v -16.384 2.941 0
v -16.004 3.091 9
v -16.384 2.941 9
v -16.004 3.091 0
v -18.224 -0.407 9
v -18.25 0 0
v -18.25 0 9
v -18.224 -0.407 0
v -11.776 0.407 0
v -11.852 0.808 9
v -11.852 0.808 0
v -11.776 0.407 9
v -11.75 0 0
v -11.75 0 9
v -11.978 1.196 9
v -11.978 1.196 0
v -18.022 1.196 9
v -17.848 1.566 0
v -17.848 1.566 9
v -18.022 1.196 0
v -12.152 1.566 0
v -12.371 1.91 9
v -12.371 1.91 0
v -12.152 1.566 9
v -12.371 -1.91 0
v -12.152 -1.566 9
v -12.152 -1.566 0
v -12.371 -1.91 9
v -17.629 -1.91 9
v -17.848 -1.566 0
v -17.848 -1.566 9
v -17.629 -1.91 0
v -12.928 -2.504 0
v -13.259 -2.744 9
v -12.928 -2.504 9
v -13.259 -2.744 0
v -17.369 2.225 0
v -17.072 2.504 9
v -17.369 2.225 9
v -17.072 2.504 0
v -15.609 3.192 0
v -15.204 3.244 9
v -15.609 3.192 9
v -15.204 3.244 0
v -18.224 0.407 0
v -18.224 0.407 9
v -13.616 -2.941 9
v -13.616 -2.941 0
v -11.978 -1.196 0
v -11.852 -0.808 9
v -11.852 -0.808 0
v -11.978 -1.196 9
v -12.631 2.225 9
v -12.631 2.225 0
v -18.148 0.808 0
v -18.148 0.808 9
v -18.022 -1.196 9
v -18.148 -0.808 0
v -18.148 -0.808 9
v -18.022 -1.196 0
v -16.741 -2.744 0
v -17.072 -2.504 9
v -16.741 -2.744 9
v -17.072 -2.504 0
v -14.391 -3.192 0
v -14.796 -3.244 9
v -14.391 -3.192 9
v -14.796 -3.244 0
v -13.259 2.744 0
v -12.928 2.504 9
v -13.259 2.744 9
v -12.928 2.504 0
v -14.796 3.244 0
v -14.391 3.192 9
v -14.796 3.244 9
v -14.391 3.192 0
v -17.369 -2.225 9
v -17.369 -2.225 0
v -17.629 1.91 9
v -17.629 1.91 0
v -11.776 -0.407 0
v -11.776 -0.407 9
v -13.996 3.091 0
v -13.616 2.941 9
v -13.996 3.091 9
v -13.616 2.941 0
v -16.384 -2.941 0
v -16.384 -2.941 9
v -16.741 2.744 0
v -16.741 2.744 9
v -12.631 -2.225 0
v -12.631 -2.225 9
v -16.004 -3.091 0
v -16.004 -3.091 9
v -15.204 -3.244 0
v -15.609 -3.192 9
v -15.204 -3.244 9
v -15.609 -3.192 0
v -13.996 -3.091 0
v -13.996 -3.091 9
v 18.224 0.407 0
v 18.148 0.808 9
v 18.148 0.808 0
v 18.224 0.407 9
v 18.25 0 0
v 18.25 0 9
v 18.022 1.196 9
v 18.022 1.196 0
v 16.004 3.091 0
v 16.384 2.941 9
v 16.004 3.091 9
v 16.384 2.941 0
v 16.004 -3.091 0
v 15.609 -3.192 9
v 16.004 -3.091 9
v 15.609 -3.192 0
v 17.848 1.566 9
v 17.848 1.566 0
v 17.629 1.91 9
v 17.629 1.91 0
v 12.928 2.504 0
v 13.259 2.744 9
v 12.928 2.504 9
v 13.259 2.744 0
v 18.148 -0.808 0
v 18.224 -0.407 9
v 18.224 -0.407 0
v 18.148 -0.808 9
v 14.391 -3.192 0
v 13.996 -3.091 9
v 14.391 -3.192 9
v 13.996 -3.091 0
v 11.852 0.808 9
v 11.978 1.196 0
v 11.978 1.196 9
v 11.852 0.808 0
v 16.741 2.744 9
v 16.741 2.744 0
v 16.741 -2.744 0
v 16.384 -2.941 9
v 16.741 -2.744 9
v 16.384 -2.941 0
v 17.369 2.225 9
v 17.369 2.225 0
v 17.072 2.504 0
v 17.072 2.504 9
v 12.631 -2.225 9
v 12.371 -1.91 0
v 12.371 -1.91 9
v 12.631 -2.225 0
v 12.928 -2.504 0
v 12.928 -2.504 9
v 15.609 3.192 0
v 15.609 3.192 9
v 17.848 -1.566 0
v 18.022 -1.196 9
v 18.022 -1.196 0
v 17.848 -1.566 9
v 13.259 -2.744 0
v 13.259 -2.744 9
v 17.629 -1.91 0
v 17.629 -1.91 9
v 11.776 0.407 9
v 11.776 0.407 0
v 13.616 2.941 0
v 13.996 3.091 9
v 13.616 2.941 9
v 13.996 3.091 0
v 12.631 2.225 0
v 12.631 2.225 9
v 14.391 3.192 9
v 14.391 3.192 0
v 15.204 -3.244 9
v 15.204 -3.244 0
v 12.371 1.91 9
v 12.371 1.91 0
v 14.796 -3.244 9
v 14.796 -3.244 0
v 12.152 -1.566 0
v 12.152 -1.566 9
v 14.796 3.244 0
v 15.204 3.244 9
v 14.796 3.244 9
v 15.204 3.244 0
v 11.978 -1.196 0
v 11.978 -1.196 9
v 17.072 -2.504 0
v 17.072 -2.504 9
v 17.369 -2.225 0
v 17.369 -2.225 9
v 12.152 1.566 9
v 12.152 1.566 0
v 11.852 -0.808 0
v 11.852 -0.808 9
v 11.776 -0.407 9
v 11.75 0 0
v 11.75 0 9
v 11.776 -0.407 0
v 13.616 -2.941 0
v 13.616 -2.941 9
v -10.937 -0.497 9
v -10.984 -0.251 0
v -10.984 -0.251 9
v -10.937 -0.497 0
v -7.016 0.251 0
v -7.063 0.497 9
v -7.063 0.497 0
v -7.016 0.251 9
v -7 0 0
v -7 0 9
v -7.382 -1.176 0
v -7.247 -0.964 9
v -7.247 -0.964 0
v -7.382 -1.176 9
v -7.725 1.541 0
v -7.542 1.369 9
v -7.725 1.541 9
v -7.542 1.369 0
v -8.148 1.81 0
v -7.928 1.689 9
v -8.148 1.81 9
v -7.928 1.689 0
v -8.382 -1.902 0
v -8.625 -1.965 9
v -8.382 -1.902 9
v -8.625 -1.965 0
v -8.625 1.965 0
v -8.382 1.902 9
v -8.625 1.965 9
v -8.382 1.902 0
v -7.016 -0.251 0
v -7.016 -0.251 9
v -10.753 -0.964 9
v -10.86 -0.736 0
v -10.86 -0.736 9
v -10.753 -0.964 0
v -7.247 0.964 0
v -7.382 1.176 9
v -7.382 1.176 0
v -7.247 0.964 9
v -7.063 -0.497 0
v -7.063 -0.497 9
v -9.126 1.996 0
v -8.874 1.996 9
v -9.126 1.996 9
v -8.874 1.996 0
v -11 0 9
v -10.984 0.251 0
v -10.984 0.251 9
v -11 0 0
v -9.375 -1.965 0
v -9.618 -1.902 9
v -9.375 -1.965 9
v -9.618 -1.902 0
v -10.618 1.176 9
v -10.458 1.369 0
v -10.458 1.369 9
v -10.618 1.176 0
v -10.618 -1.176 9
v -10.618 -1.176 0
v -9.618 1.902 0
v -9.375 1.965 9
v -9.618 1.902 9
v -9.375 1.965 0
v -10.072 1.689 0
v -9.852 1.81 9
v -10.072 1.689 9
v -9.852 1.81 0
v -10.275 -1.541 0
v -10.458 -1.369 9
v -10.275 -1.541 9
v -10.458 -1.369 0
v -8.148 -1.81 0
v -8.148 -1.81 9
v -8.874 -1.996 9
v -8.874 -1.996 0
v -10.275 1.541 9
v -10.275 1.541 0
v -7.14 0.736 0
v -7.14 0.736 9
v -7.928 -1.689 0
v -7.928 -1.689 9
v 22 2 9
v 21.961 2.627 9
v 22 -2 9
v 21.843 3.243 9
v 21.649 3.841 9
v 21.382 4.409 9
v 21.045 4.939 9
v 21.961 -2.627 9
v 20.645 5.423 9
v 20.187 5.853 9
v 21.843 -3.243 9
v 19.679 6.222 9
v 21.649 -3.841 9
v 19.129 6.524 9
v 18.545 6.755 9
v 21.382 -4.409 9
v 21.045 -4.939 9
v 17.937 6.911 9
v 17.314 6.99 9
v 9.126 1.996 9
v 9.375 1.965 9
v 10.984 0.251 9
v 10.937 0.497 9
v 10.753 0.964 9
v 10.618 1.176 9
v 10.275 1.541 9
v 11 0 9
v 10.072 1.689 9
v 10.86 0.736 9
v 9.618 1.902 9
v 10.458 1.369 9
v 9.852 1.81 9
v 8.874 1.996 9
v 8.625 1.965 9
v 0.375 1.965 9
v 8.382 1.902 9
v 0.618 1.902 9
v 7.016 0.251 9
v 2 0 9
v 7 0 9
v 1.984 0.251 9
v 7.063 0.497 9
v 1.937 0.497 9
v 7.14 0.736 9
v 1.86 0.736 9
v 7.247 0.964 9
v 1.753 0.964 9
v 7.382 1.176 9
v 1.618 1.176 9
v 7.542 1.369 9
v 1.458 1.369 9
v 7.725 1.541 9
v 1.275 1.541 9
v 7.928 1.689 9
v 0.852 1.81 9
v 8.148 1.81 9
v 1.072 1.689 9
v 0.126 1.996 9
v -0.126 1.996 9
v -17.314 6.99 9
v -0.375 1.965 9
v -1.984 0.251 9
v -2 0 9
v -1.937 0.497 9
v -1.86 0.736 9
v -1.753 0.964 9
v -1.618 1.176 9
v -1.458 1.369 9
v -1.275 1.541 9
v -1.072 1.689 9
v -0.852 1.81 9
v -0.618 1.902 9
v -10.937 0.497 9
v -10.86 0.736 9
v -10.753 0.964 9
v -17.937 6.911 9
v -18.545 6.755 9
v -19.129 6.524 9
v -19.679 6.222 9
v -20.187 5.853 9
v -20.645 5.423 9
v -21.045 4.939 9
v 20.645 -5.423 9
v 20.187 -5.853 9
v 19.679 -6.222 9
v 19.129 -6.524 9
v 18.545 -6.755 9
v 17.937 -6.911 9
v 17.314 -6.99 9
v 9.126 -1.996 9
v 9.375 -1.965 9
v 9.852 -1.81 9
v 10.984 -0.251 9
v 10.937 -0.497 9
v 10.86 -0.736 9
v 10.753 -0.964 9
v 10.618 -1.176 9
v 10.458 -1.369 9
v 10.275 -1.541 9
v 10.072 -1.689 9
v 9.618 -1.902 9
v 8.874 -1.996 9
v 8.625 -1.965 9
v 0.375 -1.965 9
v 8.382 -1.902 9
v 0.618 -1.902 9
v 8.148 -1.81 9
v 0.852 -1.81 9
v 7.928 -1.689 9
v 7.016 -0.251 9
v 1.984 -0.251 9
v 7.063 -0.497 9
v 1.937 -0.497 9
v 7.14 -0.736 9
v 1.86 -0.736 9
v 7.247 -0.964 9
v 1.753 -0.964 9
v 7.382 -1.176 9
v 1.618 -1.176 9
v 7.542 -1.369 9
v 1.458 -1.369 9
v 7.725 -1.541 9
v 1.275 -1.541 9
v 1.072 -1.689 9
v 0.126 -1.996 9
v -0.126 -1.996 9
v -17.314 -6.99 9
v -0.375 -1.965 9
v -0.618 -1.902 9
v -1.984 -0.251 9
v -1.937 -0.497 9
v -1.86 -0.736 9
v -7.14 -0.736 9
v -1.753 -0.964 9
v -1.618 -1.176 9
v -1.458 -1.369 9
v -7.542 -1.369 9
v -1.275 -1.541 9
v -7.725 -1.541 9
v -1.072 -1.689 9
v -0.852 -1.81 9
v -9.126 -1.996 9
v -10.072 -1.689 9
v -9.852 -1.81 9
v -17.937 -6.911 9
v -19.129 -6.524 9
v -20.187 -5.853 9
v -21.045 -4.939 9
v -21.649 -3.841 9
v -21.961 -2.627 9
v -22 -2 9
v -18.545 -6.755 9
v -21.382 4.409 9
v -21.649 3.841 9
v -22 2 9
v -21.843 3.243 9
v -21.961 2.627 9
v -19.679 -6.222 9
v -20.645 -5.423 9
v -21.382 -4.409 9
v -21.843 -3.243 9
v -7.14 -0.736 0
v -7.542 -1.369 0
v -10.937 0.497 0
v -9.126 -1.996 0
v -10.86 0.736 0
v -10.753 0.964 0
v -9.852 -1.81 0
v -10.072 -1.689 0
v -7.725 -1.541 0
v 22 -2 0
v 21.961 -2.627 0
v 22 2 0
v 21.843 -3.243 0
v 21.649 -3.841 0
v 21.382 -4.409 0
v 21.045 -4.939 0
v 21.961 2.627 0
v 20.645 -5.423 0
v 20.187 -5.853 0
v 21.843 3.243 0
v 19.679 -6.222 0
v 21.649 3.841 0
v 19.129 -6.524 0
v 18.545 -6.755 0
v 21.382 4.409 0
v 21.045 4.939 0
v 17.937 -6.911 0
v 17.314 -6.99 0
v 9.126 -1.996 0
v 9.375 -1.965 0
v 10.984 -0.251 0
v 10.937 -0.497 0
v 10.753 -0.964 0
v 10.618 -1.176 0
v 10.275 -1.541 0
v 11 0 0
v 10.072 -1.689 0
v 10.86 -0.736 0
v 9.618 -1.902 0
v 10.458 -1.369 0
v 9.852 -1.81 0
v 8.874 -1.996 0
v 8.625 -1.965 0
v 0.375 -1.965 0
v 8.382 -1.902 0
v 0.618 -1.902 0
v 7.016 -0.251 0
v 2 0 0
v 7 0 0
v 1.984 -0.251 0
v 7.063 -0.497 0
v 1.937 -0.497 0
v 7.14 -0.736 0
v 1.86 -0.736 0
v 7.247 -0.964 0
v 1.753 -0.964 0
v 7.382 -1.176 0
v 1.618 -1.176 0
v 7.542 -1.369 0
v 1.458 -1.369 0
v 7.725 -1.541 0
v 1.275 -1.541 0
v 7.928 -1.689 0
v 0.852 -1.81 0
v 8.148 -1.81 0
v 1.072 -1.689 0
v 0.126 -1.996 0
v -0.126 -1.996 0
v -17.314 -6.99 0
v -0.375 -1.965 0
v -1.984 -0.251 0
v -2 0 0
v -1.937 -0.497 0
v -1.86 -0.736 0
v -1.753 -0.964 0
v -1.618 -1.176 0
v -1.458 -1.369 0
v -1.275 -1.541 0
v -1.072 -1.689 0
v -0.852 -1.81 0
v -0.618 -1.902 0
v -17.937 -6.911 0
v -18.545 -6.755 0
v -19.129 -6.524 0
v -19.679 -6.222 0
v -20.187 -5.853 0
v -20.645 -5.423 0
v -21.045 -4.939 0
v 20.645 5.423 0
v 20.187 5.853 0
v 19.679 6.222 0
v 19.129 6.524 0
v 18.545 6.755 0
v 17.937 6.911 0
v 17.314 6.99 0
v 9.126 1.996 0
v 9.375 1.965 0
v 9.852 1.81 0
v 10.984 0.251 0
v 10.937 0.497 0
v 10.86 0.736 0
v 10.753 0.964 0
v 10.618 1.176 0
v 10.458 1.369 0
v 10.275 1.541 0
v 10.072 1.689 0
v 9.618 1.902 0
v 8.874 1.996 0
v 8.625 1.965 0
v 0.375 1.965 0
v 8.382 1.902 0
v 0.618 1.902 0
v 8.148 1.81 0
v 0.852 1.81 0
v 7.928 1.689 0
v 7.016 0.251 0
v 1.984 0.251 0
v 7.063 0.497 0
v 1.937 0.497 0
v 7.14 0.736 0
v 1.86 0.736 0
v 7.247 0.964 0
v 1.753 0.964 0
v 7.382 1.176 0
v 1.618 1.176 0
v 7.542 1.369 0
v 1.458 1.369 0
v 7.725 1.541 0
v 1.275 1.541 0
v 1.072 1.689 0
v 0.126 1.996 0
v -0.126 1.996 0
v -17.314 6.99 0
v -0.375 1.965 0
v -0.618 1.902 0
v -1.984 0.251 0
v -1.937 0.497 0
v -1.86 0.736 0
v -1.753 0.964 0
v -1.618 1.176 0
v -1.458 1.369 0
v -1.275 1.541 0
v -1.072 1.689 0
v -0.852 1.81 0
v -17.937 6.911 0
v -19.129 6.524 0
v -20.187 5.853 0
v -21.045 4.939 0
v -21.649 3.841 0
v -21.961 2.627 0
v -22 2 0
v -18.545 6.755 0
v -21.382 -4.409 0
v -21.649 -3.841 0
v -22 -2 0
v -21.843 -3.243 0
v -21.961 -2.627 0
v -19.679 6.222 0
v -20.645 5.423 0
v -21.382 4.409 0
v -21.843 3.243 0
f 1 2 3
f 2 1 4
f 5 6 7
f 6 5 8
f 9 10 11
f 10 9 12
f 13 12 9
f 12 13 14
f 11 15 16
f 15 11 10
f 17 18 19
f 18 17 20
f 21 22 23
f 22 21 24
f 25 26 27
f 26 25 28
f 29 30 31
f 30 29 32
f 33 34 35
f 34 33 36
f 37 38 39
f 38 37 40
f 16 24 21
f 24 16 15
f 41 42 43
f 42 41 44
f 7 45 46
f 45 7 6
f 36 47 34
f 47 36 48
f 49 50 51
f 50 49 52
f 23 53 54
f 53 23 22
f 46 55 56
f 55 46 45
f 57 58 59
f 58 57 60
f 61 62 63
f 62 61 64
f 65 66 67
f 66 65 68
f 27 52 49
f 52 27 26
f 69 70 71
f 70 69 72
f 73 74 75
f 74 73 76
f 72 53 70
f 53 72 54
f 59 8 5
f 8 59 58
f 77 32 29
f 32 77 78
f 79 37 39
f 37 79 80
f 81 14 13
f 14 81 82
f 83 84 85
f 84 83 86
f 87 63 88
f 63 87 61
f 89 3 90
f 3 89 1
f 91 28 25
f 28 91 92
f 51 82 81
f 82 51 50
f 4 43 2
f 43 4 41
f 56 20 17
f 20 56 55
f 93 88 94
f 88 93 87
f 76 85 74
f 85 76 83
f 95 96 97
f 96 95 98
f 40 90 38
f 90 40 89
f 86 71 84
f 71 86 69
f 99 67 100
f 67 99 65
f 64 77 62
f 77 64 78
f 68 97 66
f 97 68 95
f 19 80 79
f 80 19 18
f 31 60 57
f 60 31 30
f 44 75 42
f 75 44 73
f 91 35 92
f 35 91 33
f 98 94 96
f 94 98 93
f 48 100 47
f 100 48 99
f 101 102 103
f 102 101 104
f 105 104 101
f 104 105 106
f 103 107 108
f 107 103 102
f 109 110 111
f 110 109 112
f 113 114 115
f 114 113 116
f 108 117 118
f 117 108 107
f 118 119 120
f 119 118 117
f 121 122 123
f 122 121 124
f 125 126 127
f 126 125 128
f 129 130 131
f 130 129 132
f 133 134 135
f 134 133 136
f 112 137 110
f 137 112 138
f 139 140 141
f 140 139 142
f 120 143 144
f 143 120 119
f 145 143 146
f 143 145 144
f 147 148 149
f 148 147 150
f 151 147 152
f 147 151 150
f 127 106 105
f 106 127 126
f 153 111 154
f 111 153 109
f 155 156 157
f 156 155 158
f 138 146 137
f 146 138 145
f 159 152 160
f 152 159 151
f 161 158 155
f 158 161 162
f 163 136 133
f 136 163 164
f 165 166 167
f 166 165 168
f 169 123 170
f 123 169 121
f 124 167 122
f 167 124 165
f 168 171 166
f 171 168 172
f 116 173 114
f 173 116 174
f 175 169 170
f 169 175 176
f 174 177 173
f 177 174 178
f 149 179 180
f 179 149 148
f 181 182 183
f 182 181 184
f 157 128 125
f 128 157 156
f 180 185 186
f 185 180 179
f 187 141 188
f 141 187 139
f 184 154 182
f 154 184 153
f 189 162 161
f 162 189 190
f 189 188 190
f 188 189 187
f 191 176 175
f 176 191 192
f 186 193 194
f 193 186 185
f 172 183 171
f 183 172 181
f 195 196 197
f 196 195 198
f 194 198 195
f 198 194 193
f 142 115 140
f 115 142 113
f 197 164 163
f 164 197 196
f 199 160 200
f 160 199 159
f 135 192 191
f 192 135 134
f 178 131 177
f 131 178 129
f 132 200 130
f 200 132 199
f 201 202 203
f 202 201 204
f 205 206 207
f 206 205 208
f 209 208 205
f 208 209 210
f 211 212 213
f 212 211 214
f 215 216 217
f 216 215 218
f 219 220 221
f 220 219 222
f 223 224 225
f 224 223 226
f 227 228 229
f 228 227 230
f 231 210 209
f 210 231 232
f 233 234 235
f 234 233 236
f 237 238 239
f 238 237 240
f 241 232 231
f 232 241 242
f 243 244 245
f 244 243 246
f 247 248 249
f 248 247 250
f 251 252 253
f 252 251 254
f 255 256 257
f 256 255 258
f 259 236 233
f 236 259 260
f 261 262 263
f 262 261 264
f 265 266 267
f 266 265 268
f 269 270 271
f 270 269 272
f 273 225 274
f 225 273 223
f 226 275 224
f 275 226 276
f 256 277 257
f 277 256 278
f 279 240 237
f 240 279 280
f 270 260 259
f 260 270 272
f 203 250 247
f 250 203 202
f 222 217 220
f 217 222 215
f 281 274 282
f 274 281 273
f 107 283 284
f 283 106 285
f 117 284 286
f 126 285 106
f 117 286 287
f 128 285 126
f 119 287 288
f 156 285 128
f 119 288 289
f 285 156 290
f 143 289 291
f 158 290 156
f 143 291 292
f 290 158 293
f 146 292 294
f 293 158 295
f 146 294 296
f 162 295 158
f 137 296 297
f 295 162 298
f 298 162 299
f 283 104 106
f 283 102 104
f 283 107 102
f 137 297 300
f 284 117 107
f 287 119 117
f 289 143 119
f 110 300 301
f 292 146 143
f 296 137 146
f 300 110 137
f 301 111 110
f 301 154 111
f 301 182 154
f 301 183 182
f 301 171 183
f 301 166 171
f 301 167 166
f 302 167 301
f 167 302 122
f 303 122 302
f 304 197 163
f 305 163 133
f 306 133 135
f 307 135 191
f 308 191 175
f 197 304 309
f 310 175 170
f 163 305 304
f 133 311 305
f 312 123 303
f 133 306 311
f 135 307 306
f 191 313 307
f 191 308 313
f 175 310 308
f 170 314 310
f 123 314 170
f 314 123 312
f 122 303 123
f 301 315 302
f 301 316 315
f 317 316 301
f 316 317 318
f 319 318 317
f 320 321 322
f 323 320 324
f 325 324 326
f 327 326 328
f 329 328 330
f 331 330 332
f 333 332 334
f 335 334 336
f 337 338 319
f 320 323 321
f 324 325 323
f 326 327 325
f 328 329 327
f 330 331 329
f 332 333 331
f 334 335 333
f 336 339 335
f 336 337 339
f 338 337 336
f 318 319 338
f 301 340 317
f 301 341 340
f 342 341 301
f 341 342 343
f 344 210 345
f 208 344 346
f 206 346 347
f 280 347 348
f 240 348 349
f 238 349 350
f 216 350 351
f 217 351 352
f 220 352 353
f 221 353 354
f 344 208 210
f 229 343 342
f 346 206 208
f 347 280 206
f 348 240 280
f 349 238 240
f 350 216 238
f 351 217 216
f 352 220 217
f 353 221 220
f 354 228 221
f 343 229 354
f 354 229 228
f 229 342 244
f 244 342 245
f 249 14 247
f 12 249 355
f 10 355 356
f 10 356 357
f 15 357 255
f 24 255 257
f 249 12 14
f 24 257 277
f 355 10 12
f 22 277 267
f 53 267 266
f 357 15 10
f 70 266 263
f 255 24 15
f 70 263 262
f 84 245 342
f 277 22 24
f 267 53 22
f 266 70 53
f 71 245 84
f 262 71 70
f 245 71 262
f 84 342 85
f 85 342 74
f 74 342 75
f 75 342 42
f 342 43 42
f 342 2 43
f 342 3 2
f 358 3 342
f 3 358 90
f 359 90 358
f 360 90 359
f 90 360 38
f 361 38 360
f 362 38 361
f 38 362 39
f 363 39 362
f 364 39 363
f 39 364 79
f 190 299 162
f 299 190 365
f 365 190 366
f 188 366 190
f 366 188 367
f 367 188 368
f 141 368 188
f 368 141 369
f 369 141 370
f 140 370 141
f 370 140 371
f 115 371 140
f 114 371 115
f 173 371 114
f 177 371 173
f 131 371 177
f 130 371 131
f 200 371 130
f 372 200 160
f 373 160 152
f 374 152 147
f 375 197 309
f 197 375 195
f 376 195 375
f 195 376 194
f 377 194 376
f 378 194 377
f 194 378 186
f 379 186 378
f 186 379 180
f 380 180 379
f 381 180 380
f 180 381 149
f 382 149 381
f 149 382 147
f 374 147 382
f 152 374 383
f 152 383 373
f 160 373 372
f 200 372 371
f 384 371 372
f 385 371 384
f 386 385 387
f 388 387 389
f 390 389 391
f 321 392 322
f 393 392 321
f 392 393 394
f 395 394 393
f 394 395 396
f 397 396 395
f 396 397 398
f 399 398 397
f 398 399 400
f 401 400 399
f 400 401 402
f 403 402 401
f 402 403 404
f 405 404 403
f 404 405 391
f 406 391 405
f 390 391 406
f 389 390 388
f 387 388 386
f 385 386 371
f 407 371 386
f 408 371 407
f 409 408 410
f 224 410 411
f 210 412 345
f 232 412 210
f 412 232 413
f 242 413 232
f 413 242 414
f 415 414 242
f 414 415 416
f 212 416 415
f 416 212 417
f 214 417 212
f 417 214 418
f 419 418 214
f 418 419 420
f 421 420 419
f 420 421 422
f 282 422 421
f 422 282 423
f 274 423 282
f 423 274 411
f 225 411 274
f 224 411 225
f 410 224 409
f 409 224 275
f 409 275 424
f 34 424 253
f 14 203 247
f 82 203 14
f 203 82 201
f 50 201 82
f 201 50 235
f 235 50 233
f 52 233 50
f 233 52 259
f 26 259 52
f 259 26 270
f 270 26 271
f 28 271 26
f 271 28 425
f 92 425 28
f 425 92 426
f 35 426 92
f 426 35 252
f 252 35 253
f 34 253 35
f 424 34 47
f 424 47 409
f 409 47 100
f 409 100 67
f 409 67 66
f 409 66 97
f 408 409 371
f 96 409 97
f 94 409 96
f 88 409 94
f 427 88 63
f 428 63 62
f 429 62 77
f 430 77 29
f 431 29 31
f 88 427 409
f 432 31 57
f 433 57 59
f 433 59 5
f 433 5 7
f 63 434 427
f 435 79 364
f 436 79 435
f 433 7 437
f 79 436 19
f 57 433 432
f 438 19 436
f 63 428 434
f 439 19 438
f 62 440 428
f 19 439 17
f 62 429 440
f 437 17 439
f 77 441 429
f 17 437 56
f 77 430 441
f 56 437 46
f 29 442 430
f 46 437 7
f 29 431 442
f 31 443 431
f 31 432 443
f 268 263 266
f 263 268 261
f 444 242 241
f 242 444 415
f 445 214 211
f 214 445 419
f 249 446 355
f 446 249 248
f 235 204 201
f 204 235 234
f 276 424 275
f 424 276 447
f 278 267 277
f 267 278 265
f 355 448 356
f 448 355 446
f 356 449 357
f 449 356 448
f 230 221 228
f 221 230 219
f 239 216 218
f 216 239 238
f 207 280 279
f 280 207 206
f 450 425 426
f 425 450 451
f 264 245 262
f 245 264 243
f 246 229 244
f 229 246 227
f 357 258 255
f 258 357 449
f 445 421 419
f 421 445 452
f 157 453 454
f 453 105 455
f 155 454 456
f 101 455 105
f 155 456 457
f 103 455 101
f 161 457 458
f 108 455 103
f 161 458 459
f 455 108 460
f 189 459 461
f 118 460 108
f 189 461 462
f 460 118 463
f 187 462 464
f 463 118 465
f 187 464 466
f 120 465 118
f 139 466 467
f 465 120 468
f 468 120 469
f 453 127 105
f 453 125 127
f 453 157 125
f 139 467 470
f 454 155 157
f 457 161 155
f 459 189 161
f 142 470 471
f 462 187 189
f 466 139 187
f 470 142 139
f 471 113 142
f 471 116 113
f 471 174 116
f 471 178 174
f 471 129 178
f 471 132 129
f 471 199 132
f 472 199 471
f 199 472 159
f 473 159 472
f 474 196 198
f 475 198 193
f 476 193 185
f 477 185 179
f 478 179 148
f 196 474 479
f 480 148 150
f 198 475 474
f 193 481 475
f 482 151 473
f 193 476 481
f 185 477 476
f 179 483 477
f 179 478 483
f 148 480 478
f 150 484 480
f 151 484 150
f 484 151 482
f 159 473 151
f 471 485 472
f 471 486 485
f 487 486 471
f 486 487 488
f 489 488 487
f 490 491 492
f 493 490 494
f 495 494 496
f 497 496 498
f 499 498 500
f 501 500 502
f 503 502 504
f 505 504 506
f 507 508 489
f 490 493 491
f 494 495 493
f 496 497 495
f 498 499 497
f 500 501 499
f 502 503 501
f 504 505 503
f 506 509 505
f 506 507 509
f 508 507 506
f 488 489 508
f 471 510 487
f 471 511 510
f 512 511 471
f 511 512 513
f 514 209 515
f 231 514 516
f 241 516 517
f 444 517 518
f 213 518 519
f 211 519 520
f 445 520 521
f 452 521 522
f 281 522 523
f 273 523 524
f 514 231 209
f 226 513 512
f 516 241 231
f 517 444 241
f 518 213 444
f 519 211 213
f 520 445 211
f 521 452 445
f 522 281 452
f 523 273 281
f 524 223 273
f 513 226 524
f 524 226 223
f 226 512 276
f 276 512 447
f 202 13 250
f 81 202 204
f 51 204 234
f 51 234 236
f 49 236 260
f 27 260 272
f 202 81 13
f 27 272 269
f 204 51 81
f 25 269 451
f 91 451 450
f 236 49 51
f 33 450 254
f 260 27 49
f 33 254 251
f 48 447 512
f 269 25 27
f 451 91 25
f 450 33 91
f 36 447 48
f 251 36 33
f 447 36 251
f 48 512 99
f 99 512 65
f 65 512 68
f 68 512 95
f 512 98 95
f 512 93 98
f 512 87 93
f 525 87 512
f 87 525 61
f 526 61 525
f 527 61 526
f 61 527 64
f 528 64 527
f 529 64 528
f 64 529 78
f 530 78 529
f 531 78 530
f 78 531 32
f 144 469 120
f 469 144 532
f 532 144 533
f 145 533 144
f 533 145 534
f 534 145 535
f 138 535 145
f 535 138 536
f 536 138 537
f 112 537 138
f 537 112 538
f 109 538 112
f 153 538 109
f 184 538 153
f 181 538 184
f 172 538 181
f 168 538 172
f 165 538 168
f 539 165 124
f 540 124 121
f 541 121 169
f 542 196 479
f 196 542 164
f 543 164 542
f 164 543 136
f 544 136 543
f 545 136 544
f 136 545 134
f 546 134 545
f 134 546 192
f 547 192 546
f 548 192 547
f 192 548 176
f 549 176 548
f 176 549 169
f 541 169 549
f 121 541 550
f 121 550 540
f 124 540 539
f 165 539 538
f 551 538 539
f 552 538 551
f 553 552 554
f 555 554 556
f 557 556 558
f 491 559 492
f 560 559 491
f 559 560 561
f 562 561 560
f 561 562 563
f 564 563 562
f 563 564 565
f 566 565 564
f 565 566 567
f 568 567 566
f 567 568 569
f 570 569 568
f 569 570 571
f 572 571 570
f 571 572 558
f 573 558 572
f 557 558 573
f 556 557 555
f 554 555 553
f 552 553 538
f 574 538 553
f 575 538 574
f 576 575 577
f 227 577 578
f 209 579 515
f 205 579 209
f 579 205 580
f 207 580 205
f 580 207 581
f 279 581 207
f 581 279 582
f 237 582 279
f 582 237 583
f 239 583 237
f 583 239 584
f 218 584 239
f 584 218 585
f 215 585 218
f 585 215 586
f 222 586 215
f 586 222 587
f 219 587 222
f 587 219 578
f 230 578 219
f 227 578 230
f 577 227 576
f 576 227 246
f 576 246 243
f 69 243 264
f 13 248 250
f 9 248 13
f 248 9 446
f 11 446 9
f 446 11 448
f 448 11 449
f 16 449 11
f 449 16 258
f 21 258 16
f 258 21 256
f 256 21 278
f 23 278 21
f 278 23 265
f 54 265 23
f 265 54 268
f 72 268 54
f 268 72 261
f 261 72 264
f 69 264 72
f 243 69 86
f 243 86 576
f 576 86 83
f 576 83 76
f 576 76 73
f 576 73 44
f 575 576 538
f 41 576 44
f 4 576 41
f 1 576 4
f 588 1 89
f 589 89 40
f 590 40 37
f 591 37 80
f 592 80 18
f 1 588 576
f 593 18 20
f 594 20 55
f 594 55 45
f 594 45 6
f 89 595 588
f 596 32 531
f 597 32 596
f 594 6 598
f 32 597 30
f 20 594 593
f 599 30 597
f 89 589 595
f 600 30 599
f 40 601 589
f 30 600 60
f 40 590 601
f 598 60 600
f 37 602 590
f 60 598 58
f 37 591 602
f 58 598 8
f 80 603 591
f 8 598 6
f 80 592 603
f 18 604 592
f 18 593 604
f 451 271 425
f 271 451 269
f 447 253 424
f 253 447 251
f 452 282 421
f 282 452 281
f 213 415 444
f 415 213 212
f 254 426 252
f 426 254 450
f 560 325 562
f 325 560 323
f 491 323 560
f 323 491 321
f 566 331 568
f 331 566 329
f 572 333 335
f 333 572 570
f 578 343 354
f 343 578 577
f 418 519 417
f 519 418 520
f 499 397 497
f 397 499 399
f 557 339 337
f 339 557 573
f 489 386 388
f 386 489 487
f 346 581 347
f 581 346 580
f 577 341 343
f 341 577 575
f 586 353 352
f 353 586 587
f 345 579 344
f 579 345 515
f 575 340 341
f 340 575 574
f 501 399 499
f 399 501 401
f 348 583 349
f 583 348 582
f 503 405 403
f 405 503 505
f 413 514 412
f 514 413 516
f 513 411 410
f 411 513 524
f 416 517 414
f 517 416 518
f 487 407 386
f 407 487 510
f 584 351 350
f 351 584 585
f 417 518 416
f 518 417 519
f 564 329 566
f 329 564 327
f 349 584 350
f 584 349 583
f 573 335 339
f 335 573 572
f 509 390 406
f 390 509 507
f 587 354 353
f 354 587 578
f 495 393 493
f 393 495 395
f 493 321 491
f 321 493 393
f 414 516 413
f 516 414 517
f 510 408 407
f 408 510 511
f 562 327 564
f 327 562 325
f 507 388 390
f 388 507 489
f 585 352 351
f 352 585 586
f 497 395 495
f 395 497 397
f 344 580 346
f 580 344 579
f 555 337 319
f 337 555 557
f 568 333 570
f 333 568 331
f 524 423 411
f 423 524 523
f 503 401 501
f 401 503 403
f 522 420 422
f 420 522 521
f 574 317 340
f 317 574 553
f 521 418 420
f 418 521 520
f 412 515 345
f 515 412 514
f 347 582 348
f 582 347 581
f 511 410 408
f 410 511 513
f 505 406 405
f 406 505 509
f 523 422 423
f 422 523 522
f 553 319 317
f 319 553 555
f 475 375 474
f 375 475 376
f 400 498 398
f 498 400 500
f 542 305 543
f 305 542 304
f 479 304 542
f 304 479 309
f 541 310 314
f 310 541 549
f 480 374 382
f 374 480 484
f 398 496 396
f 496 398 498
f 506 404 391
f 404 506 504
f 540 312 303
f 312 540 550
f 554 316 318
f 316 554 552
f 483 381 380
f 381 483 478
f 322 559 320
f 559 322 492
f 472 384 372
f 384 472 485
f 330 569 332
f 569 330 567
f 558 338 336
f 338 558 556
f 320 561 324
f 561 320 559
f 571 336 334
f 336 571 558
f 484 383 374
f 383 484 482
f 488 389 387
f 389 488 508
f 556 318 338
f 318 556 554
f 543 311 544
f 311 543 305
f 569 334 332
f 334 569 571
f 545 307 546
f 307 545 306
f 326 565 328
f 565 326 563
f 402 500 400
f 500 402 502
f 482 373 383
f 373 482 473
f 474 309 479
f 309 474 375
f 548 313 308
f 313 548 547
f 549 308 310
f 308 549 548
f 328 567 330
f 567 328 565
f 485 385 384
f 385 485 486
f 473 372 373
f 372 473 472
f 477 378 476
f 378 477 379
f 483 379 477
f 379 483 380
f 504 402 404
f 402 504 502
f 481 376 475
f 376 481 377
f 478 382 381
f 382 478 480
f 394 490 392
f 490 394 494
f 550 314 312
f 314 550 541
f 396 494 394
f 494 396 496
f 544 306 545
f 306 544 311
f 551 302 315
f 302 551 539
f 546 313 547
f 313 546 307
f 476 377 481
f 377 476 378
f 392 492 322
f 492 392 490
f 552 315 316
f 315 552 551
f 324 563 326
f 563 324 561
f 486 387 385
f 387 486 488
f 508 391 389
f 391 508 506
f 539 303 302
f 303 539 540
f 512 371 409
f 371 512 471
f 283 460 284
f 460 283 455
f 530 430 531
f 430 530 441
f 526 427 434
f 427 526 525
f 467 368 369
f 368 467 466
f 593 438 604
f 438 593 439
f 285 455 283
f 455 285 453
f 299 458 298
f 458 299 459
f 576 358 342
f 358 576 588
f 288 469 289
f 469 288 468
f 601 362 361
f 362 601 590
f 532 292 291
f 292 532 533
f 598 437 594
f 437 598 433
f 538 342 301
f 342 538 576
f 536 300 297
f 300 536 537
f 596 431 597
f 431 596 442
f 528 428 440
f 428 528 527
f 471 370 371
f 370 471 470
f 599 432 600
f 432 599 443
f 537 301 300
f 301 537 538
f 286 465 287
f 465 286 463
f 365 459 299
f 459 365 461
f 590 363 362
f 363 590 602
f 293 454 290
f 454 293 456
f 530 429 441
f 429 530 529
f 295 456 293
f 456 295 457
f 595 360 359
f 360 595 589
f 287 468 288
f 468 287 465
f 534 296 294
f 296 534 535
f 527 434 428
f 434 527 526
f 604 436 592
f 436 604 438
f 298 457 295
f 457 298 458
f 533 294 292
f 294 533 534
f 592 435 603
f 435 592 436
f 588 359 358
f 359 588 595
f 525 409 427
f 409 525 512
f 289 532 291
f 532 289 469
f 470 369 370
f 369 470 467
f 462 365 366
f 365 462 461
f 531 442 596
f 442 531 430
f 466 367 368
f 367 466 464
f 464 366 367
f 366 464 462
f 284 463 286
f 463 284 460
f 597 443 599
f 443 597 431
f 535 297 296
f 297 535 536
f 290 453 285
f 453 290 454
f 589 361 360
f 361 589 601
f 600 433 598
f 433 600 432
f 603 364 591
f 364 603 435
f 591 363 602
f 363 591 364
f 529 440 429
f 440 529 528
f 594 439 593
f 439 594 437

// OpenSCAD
$fn = 50;


difference() {
	union() {
		hull() {
			translate(v = [-17.0000000000, 2.0000000000, 0]) {
				cylinder(h = 9, r = 5);
			}
			translate(v = [17.0000000000, 2.0000000000, 0]) {
				cylinder(h = 9, r = 5);
			}
			translate(v = [-17.0000000000, -2.0000000000, 0]) {
				cylinder(h = 9, r = 5);
			}
			translate(v = [17.0000000000, -2.0000000000, 0]) {
				cylinder(h = 9, r = 5);
			}
		}
	}
	union() {
		#translate(v = [-15.0000000000, 0.0000000000, 0]) {
			cylinder(h = 9, r = 3.2500000000);
		}
		#translate(v = [15.0000000000, 0.0000000000, 0]) {
			cylinder(h = 9, r = 3.2500000000);
		}
		#translate(v = [-15.0000000000, 0.0000000000, -100.0000000000]) {
			cylinder(h = 200, r = 3.2500000000);
		}
		#translate(v = [-15.0000000000, 0.0000000000, -100.0000000000]) {
			cylinder(h = 200, r = 3.2500000000);
		}
		#translate(v = [15.0000000000, 0.0000000000, -100.0000000000]) {
			cylinder(h = 200, r = 3.2500000000);
		}
		#translate(v = [15.0000000000, 0.0000000000, -100.0000000000]) {
			cylinder(h = 200, r = 3.2500000000);
		}
		#translate(v = [-15.0000000000, 0.0000000000, 0]) {
			cylinder(h = 9, r = 1.8000000000);
		}
		#translate(v = [15.0000000000, 0.0000000000, 0]) {
			cylinder(h = 9, r = 1.8000000000);
		}
		#translate(v = [-15.0000000000, 0.0000000000, 0]) {
			cylinder(h = 9, r = 1.8000000000);
		}
		#translate(v = [15.0000000000, 0.0000000000, 0]) {
			cylinder(h = 9, r = 1.8000000000);
		}
		#translate(v = [-15.0000000000, 0.0000000000, 0]) {
			cylinder(h = 9, r = 1.8000000000);
		}
		#translate(v = [15.0000000000, 0.0000000000, 0]) {
			cylinder(h = 9, r = 1.8000000000);
		}
		#translate(v = [-9.0000000000, 0, 0]) {
			cylinder(h = 9, r = 2.0000000000);
		}
		#cylinder(h = 9, r = 2.0000000000);
		#translate(v = [9.0000000000, 0, 0]) {
			cylinder(h = 9, r = 2.0000000000);
		}
	}
}
